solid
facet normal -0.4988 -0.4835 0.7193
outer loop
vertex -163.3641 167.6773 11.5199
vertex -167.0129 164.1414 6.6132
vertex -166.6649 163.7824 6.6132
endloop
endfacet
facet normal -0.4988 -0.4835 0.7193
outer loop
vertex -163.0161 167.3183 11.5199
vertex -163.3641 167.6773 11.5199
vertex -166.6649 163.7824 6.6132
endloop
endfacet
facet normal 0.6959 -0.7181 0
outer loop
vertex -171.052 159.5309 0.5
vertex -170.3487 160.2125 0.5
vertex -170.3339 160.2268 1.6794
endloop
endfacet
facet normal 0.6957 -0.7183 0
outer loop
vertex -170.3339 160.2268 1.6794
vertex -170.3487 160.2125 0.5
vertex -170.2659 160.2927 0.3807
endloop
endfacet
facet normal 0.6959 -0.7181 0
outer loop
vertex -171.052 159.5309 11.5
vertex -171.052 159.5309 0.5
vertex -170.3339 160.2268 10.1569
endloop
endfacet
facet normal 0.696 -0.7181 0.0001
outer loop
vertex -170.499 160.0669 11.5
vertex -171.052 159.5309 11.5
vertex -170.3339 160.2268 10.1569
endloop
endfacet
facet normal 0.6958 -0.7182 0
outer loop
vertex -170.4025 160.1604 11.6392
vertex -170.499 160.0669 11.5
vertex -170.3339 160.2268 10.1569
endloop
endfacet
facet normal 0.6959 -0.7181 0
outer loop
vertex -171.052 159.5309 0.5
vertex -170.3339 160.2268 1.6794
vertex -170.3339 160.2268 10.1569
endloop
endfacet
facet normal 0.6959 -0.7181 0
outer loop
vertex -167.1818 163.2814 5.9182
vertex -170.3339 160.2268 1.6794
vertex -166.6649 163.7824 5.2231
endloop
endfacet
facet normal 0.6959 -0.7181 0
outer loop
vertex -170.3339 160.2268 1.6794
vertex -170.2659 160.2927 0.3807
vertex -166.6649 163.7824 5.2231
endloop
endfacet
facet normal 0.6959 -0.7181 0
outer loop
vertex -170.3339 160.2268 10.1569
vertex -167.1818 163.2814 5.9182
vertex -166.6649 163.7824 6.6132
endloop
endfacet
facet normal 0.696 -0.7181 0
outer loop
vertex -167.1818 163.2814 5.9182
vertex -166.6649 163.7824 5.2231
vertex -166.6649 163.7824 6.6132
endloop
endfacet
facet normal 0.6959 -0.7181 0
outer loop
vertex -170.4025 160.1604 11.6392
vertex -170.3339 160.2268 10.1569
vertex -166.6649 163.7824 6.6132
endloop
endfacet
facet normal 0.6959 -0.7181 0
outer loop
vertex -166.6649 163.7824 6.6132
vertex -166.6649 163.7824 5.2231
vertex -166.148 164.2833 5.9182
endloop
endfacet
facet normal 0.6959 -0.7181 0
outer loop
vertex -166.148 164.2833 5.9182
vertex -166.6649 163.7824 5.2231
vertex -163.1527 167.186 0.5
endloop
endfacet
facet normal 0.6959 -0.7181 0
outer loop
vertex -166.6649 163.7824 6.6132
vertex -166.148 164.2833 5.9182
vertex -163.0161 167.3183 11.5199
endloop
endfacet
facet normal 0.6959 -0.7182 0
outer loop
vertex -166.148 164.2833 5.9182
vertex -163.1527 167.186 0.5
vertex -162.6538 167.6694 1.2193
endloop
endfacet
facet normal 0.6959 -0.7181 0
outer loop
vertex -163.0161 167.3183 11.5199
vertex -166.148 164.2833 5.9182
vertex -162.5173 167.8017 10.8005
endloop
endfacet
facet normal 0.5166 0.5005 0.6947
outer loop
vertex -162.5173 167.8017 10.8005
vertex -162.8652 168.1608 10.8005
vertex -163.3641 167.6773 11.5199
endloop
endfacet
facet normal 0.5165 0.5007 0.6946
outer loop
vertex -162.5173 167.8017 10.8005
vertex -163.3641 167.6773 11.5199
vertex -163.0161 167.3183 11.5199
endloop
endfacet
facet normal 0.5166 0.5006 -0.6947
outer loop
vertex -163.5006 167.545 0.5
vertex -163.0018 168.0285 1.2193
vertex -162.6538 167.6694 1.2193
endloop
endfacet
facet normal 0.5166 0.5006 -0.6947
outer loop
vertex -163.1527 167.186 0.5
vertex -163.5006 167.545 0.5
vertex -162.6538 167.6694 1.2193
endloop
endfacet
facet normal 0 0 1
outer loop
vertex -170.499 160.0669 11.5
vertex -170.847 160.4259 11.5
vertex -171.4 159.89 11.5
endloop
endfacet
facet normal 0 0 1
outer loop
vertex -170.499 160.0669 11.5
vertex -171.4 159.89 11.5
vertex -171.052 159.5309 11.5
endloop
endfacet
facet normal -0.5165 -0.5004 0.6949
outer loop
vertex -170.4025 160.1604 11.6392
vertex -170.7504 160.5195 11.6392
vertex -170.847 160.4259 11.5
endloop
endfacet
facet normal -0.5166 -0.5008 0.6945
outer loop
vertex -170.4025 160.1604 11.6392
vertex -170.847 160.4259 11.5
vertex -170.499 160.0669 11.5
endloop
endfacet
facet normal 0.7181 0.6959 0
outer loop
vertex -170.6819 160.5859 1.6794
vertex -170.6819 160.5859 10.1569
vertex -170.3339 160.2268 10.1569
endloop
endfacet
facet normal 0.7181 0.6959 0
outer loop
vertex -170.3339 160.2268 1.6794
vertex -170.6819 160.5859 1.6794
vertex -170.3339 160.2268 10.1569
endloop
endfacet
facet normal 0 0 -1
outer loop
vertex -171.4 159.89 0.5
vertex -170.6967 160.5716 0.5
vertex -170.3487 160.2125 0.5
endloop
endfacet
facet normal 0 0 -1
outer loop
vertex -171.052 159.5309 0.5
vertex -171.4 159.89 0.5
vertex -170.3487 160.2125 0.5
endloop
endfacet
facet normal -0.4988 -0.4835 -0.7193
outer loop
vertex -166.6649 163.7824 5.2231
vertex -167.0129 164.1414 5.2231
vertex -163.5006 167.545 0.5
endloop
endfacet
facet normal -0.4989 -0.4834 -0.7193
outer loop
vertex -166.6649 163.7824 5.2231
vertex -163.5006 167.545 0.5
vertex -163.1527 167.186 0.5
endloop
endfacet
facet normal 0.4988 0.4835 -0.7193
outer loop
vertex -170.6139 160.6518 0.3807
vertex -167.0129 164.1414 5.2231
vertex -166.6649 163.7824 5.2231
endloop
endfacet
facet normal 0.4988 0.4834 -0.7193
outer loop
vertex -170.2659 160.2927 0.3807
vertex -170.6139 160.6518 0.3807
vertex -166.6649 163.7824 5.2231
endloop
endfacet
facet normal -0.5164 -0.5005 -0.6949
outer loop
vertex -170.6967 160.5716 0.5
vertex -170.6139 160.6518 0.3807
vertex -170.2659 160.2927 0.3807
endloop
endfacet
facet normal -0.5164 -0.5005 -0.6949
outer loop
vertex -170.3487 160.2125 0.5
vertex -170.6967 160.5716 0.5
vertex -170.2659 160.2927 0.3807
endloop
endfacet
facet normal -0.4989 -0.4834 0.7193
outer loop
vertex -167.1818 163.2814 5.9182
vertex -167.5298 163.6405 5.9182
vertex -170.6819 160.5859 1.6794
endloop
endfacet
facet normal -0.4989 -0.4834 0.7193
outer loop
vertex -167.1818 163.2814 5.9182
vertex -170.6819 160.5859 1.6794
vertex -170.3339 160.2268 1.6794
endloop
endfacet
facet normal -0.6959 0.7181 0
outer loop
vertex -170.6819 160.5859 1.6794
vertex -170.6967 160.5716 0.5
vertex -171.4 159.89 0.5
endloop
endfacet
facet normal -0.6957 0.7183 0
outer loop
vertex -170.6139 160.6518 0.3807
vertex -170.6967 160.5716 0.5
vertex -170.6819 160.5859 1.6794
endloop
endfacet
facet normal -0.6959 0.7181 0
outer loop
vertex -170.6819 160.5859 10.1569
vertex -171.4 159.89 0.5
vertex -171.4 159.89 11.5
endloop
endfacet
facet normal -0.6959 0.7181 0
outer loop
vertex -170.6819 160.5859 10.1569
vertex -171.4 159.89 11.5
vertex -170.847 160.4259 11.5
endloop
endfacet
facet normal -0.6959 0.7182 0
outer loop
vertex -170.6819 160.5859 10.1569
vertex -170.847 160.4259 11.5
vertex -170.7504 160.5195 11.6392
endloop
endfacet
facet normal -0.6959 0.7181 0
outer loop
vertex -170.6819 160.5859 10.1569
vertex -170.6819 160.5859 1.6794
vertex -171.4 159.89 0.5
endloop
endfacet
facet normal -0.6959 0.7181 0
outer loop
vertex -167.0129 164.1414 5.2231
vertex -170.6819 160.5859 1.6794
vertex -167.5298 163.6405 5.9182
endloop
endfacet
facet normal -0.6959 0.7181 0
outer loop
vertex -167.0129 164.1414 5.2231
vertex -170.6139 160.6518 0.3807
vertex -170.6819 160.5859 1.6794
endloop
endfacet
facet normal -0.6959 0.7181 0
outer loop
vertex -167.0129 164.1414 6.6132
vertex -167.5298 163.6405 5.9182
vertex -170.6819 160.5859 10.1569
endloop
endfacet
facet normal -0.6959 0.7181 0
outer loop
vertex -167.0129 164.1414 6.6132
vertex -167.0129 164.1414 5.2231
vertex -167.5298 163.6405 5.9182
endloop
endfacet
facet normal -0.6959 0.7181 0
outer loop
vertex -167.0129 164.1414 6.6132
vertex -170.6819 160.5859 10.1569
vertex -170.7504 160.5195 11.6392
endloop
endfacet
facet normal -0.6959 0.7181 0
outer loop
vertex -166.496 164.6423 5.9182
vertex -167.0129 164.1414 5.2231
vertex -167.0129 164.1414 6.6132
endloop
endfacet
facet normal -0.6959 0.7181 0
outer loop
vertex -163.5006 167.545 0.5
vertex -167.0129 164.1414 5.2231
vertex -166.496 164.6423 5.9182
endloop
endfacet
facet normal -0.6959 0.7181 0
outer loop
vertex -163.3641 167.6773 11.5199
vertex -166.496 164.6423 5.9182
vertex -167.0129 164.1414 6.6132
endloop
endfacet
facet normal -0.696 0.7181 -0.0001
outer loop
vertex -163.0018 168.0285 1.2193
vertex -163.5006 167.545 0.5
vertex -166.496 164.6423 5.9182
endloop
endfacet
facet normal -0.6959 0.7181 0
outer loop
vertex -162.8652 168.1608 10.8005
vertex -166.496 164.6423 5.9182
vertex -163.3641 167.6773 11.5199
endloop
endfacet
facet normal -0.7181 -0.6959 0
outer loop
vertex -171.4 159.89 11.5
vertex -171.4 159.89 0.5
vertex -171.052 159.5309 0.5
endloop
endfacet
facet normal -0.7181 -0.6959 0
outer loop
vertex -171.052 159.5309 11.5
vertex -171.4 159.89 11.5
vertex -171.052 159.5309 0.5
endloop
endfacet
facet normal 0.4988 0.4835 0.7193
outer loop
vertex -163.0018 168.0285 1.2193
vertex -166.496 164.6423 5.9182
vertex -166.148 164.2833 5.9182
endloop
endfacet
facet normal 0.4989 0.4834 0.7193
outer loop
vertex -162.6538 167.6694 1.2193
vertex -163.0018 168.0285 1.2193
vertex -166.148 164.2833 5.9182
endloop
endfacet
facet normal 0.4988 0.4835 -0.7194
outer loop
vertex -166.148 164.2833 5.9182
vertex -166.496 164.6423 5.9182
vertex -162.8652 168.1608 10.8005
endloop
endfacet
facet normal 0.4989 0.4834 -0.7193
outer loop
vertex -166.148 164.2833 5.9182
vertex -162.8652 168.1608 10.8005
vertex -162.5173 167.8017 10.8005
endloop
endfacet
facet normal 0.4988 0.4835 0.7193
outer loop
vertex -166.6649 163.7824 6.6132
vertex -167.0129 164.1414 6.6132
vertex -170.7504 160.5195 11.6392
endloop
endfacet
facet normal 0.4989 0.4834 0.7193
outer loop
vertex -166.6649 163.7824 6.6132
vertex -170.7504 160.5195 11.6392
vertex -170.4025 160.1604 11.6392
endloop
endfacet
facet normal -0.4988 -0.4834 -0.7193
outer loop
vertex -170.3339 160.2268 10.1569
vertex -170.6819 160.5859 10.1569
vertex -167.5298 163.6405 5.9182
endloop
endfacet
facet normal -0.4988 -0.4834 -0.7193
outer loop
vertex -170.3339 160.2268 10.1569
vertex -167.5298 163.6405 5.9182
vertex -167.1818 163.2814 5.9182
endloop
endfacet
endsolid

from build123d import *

# Parameters (mm, degrees)
BOX241_W                  = 0.5
BOX241_H                  = 1
BOX241_DEPTH              = 15
BOX241_ROLL_ANGLE         = 46
BOX242_W                  = 0.5
BOX242_H                  = 1
BOX242_DEPTH              = 15
BOX242_ROLL_ANGLE         = -46
BOX240_W                  = 0.5
BOX240_H                  = 1
BOX240_DEPTH              = 11
FUSION023_PLACEMENT_ANGLE = 45.9


with BuildPart() as cubo241:
    # Box241 → Box241 (new body)
    with BuildSketch(Plane.XY):
        with Locations((0.25, 0.5)):
            Rectangle(BOX241_W, BOX241_H)
    extrude(amount=BOX241_DEPTH)


with BuildPart() as cubo241_1:
    # Box241 roll: moved
    add(cubo241.part.rotate(Axis((0, 0, 0), (1, 0, 0)), BOX241_ROLL_ANGLE))


with BuildPart() as cubo241_2:
    # Box241 placement: moved
    add(cubo241_1.part.moved(Location((0, 11, 0.5))))


with BuildPart() as cubo242:
    # Box242 → Box242 (new body)
    with BuildSketch(Plane.XY):
        with Locations((0.25, 0.5)):
            Rectangle(BOX242_W, BOX242_H)
    extrude(amount=BOX242_DEPTH)


with BuildPart() as cubo242_1:
    # Box242 roll: moved
    add(cubo242.part.rotate(Axis((0, 0, 0), (1, 0, 0)), BOX242_ROLL_ANGLE))


with BuildPart() as cubo242_2:
    # Box242 placement: moved
    add(cubo242_1.part.moved(Location((0, 0.4, 1.1))))


with BuildPart() as fusion023:
    # Box240 → Box240 (new body)
    with BuildSketch(Plane.XY.offset(0.5)):
        with Locations((0.25, 0.5)):
            Rectangle(BOX240_W, BOX240_H)
    extrude(amount=BOX240_DEPTH)

    # Fusion023: union Cubo241, Cubo242
    add(cubo241_2.part)
    add(cubo242_2.part)


with BuildPart() as fusion023_1:
    # Fusion023 placement: moved
    add(fusion023.part.moved(Location((-171.4, 159.89, 0))).rotate(Axis((-171.4, 159.89, 0), (0, 0, -1)), FUSION023_PLACEMENT_ANGLE))


solid = fusion023_1.part
